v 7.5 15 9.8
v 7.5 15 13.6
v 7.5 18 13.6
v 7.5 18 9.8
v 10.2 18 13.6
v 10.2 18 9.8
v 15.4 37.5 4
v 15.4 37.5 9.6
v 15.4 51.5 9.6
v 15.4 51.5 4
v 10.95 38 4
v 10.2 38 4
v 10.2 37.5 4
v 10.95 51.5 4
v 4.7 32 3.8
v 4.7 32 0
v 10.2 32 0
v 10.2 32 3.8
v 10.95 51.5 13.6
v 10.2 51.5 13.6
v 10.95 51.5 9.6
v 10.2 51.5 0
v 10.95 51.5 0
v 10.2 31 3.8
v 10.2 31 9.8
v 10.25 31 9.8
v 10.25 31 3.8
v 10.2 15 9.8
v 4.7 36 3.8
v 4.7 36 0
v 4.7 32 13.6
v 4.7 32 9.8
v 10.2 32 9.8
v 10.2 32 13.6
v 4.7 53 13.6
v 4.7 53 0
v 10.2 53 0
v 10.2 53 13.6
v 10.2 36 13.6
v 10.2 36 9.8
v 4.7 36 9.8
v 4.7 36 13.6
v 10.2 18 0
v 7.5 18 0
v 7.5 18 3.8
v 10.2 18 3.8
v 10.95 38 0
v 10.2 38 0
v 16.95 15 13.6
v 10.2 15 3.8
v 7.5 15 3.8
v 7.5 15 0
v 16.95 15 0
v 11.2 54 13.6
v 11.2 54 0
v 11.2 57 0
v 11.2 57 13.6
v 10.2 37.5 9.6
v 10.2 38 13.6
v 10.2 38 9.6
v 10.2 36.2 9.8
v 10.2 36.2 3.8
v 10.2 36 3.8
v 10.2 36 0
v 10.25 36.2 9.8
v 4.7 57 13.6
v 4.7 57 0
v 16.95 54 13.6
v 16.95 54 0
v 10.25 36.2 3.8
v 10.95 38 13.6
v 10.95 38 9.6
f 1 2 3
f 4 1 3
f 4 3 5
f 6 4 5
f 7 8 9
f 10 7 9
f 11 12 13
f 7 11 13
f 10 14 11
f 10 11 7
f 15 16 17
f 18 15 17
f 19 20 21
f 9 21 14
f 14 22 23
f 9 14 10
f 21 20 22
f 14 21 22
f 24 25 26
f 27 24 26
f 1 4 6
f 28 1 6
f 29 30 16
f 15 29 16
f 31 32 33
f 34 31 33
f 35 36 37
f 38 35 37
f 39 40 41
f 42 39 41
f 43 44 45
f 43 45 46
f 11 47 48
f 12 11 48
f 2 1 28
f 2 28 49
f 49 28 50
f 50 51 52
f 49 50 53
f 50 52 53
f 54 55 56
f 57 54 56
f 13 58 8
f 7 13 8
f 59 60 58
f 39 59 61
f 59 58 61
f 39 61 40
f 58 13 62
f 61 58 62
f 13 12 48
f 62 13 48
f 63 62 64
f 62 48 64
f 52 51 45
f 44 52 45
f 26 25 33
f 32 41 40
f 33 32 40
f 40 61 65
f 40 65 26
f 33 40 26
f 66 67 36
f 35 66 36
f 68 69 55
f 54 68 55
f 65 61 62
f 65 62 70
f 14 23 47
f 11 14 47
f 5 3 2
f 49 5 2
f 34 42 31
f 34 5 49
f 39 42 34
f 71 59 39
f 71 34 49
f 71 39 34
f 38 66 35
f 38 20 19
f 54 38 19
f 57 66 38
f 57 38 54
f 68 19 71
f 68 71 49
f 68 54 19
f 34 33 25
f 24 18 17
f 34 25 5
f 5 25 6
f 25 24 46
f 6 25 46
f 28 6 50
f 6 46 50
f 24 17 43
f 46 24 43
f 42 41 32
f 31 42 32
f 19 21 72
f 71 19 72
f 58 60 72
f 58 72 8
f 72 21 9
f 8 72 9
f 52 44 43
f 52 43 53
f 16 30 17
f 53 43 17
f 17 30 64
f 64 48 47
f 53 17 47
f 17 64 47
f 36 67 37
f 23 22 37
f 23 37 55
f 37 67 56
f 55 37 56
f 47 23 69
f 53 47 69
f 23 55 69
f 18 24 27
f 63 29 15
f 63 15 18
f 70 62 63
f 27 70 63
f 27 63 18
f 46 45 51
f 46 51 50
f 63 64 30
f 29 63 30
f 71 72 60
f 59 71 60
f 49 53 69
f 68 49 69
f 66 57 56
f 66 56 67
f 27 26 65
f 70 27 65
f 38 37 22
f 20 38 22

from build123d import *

# Parameters (mm, degrees)
GUIDE_AND_SOLID_STOPS_DEPTH  = 13.6
SKETCH_3_W                   = 8.4
SKETCH_3_H                   = 14
NUT_TONGUE_CHANNEL_DEPTH     = 2.8
SKETCH_4_W                   = 6.25
SKETCH_4_H                   = 5.2
LOWER_YOKE_RELIEF_DEPTH      = 3
SKETCH_5_W                   = 3.7
SKETCH_5_H                   = 3
LOWER_INWARD_STOP_DEPTH      = 3.8
SKETCH_7_W                   = 3.7
SKETCH_7_H                   = 3
EXTRUDE_2_DEPTH              = 3.8
REMOVE_LOWER_TAIL_DEPTH      = 62.002151601
REMOVE_LOWER_TAIL_DEPTH_BACK = 62.002151601
SKETCH_8_W                   = 17
SKETCH_8_H                   = 17


with BuildPart() as part:
    # 草图1 → Guide_and_solid_stops (new body)
    with BuildSketch(Plane.XY):
        Polygon((10.2, 0), (16.95, 0), (16.95, 54), (11.2, 54), (11.2, 57), (4.7, 57), (4.7, 53), (10.2, 53), (10.2, 51.5), (10.95, 51.5), (10.95, 38), (10.2, 38), (10.2, 36), (4.7, 36), (4.7, 32), (10.2, 32), align=None)
    extrude(amount=GUIDE_AND_SOLID_STOPS_DEPTH)

    # 草图3 → Nut_tongue_channel (cut, symmetric)
    with BuildSketch(Plane.XY.offset(6.8)):
        with Locations((11.2, 44.5)):
            Rectangle(SKETCH_3_W, SKETCH_3_H)
    extrude(amount=NUT_TONGUE_CHANNEL_DEPTH, both=True, mode=Mode.SUBTRACT)

    # 草图4 → Lower_yoke_relief (cut, symmetric)
    with BuildSketch(Plane.XY.offset(6.8)):
        with Locations((7.125, 33.6)):
            Rectangle(SKETCH_4_W, SKETCH_4_H)
    extrude(amount=LOWER_YOKE_RELIEF_DEPTH, both=True, mode=Mode.SUBTRACT)

    # 草图5 → Lower_inward_stop (add)
    with BuildSketch(Plane.XY):
        with Locations((9.35, 16.5)):
            Rectangle(SKETCH_5_W, SKETCH_5_H)
    extrude(amount=LOWER_INWARD_STOP_DEPTH)

    # 草图7 → 凸台-拉伸2 (add)
    with BuildSketch(Plane.XY.offset(9.8)):
        with Locations((9.35, 16.5)):
            Rectangle(SKETCH_7_W, SKETCH_7_H)
    extrude(amount=EXTRUDE_2_DEPTH)

    # 草图8 → Remove_lower_tail (cut, two sides: drawn at the far end of the back side and taken through both)
    with BuildSketch(Plane.XY.offset(-REMOVE_LOWER_TAIL_DEPTH_BACK)):
        with Locations((11.5, 6.5)):
            Rectangle(SKETCH_8_W, SKETCH_8_H)
    extrude(amount=REMOVE_LOWER_TAIL_DEPTH + REMOVE_LOWER_TAIL_DEPTH_BACK, mode=Mode.SUBTRACT)


solid = part.part
